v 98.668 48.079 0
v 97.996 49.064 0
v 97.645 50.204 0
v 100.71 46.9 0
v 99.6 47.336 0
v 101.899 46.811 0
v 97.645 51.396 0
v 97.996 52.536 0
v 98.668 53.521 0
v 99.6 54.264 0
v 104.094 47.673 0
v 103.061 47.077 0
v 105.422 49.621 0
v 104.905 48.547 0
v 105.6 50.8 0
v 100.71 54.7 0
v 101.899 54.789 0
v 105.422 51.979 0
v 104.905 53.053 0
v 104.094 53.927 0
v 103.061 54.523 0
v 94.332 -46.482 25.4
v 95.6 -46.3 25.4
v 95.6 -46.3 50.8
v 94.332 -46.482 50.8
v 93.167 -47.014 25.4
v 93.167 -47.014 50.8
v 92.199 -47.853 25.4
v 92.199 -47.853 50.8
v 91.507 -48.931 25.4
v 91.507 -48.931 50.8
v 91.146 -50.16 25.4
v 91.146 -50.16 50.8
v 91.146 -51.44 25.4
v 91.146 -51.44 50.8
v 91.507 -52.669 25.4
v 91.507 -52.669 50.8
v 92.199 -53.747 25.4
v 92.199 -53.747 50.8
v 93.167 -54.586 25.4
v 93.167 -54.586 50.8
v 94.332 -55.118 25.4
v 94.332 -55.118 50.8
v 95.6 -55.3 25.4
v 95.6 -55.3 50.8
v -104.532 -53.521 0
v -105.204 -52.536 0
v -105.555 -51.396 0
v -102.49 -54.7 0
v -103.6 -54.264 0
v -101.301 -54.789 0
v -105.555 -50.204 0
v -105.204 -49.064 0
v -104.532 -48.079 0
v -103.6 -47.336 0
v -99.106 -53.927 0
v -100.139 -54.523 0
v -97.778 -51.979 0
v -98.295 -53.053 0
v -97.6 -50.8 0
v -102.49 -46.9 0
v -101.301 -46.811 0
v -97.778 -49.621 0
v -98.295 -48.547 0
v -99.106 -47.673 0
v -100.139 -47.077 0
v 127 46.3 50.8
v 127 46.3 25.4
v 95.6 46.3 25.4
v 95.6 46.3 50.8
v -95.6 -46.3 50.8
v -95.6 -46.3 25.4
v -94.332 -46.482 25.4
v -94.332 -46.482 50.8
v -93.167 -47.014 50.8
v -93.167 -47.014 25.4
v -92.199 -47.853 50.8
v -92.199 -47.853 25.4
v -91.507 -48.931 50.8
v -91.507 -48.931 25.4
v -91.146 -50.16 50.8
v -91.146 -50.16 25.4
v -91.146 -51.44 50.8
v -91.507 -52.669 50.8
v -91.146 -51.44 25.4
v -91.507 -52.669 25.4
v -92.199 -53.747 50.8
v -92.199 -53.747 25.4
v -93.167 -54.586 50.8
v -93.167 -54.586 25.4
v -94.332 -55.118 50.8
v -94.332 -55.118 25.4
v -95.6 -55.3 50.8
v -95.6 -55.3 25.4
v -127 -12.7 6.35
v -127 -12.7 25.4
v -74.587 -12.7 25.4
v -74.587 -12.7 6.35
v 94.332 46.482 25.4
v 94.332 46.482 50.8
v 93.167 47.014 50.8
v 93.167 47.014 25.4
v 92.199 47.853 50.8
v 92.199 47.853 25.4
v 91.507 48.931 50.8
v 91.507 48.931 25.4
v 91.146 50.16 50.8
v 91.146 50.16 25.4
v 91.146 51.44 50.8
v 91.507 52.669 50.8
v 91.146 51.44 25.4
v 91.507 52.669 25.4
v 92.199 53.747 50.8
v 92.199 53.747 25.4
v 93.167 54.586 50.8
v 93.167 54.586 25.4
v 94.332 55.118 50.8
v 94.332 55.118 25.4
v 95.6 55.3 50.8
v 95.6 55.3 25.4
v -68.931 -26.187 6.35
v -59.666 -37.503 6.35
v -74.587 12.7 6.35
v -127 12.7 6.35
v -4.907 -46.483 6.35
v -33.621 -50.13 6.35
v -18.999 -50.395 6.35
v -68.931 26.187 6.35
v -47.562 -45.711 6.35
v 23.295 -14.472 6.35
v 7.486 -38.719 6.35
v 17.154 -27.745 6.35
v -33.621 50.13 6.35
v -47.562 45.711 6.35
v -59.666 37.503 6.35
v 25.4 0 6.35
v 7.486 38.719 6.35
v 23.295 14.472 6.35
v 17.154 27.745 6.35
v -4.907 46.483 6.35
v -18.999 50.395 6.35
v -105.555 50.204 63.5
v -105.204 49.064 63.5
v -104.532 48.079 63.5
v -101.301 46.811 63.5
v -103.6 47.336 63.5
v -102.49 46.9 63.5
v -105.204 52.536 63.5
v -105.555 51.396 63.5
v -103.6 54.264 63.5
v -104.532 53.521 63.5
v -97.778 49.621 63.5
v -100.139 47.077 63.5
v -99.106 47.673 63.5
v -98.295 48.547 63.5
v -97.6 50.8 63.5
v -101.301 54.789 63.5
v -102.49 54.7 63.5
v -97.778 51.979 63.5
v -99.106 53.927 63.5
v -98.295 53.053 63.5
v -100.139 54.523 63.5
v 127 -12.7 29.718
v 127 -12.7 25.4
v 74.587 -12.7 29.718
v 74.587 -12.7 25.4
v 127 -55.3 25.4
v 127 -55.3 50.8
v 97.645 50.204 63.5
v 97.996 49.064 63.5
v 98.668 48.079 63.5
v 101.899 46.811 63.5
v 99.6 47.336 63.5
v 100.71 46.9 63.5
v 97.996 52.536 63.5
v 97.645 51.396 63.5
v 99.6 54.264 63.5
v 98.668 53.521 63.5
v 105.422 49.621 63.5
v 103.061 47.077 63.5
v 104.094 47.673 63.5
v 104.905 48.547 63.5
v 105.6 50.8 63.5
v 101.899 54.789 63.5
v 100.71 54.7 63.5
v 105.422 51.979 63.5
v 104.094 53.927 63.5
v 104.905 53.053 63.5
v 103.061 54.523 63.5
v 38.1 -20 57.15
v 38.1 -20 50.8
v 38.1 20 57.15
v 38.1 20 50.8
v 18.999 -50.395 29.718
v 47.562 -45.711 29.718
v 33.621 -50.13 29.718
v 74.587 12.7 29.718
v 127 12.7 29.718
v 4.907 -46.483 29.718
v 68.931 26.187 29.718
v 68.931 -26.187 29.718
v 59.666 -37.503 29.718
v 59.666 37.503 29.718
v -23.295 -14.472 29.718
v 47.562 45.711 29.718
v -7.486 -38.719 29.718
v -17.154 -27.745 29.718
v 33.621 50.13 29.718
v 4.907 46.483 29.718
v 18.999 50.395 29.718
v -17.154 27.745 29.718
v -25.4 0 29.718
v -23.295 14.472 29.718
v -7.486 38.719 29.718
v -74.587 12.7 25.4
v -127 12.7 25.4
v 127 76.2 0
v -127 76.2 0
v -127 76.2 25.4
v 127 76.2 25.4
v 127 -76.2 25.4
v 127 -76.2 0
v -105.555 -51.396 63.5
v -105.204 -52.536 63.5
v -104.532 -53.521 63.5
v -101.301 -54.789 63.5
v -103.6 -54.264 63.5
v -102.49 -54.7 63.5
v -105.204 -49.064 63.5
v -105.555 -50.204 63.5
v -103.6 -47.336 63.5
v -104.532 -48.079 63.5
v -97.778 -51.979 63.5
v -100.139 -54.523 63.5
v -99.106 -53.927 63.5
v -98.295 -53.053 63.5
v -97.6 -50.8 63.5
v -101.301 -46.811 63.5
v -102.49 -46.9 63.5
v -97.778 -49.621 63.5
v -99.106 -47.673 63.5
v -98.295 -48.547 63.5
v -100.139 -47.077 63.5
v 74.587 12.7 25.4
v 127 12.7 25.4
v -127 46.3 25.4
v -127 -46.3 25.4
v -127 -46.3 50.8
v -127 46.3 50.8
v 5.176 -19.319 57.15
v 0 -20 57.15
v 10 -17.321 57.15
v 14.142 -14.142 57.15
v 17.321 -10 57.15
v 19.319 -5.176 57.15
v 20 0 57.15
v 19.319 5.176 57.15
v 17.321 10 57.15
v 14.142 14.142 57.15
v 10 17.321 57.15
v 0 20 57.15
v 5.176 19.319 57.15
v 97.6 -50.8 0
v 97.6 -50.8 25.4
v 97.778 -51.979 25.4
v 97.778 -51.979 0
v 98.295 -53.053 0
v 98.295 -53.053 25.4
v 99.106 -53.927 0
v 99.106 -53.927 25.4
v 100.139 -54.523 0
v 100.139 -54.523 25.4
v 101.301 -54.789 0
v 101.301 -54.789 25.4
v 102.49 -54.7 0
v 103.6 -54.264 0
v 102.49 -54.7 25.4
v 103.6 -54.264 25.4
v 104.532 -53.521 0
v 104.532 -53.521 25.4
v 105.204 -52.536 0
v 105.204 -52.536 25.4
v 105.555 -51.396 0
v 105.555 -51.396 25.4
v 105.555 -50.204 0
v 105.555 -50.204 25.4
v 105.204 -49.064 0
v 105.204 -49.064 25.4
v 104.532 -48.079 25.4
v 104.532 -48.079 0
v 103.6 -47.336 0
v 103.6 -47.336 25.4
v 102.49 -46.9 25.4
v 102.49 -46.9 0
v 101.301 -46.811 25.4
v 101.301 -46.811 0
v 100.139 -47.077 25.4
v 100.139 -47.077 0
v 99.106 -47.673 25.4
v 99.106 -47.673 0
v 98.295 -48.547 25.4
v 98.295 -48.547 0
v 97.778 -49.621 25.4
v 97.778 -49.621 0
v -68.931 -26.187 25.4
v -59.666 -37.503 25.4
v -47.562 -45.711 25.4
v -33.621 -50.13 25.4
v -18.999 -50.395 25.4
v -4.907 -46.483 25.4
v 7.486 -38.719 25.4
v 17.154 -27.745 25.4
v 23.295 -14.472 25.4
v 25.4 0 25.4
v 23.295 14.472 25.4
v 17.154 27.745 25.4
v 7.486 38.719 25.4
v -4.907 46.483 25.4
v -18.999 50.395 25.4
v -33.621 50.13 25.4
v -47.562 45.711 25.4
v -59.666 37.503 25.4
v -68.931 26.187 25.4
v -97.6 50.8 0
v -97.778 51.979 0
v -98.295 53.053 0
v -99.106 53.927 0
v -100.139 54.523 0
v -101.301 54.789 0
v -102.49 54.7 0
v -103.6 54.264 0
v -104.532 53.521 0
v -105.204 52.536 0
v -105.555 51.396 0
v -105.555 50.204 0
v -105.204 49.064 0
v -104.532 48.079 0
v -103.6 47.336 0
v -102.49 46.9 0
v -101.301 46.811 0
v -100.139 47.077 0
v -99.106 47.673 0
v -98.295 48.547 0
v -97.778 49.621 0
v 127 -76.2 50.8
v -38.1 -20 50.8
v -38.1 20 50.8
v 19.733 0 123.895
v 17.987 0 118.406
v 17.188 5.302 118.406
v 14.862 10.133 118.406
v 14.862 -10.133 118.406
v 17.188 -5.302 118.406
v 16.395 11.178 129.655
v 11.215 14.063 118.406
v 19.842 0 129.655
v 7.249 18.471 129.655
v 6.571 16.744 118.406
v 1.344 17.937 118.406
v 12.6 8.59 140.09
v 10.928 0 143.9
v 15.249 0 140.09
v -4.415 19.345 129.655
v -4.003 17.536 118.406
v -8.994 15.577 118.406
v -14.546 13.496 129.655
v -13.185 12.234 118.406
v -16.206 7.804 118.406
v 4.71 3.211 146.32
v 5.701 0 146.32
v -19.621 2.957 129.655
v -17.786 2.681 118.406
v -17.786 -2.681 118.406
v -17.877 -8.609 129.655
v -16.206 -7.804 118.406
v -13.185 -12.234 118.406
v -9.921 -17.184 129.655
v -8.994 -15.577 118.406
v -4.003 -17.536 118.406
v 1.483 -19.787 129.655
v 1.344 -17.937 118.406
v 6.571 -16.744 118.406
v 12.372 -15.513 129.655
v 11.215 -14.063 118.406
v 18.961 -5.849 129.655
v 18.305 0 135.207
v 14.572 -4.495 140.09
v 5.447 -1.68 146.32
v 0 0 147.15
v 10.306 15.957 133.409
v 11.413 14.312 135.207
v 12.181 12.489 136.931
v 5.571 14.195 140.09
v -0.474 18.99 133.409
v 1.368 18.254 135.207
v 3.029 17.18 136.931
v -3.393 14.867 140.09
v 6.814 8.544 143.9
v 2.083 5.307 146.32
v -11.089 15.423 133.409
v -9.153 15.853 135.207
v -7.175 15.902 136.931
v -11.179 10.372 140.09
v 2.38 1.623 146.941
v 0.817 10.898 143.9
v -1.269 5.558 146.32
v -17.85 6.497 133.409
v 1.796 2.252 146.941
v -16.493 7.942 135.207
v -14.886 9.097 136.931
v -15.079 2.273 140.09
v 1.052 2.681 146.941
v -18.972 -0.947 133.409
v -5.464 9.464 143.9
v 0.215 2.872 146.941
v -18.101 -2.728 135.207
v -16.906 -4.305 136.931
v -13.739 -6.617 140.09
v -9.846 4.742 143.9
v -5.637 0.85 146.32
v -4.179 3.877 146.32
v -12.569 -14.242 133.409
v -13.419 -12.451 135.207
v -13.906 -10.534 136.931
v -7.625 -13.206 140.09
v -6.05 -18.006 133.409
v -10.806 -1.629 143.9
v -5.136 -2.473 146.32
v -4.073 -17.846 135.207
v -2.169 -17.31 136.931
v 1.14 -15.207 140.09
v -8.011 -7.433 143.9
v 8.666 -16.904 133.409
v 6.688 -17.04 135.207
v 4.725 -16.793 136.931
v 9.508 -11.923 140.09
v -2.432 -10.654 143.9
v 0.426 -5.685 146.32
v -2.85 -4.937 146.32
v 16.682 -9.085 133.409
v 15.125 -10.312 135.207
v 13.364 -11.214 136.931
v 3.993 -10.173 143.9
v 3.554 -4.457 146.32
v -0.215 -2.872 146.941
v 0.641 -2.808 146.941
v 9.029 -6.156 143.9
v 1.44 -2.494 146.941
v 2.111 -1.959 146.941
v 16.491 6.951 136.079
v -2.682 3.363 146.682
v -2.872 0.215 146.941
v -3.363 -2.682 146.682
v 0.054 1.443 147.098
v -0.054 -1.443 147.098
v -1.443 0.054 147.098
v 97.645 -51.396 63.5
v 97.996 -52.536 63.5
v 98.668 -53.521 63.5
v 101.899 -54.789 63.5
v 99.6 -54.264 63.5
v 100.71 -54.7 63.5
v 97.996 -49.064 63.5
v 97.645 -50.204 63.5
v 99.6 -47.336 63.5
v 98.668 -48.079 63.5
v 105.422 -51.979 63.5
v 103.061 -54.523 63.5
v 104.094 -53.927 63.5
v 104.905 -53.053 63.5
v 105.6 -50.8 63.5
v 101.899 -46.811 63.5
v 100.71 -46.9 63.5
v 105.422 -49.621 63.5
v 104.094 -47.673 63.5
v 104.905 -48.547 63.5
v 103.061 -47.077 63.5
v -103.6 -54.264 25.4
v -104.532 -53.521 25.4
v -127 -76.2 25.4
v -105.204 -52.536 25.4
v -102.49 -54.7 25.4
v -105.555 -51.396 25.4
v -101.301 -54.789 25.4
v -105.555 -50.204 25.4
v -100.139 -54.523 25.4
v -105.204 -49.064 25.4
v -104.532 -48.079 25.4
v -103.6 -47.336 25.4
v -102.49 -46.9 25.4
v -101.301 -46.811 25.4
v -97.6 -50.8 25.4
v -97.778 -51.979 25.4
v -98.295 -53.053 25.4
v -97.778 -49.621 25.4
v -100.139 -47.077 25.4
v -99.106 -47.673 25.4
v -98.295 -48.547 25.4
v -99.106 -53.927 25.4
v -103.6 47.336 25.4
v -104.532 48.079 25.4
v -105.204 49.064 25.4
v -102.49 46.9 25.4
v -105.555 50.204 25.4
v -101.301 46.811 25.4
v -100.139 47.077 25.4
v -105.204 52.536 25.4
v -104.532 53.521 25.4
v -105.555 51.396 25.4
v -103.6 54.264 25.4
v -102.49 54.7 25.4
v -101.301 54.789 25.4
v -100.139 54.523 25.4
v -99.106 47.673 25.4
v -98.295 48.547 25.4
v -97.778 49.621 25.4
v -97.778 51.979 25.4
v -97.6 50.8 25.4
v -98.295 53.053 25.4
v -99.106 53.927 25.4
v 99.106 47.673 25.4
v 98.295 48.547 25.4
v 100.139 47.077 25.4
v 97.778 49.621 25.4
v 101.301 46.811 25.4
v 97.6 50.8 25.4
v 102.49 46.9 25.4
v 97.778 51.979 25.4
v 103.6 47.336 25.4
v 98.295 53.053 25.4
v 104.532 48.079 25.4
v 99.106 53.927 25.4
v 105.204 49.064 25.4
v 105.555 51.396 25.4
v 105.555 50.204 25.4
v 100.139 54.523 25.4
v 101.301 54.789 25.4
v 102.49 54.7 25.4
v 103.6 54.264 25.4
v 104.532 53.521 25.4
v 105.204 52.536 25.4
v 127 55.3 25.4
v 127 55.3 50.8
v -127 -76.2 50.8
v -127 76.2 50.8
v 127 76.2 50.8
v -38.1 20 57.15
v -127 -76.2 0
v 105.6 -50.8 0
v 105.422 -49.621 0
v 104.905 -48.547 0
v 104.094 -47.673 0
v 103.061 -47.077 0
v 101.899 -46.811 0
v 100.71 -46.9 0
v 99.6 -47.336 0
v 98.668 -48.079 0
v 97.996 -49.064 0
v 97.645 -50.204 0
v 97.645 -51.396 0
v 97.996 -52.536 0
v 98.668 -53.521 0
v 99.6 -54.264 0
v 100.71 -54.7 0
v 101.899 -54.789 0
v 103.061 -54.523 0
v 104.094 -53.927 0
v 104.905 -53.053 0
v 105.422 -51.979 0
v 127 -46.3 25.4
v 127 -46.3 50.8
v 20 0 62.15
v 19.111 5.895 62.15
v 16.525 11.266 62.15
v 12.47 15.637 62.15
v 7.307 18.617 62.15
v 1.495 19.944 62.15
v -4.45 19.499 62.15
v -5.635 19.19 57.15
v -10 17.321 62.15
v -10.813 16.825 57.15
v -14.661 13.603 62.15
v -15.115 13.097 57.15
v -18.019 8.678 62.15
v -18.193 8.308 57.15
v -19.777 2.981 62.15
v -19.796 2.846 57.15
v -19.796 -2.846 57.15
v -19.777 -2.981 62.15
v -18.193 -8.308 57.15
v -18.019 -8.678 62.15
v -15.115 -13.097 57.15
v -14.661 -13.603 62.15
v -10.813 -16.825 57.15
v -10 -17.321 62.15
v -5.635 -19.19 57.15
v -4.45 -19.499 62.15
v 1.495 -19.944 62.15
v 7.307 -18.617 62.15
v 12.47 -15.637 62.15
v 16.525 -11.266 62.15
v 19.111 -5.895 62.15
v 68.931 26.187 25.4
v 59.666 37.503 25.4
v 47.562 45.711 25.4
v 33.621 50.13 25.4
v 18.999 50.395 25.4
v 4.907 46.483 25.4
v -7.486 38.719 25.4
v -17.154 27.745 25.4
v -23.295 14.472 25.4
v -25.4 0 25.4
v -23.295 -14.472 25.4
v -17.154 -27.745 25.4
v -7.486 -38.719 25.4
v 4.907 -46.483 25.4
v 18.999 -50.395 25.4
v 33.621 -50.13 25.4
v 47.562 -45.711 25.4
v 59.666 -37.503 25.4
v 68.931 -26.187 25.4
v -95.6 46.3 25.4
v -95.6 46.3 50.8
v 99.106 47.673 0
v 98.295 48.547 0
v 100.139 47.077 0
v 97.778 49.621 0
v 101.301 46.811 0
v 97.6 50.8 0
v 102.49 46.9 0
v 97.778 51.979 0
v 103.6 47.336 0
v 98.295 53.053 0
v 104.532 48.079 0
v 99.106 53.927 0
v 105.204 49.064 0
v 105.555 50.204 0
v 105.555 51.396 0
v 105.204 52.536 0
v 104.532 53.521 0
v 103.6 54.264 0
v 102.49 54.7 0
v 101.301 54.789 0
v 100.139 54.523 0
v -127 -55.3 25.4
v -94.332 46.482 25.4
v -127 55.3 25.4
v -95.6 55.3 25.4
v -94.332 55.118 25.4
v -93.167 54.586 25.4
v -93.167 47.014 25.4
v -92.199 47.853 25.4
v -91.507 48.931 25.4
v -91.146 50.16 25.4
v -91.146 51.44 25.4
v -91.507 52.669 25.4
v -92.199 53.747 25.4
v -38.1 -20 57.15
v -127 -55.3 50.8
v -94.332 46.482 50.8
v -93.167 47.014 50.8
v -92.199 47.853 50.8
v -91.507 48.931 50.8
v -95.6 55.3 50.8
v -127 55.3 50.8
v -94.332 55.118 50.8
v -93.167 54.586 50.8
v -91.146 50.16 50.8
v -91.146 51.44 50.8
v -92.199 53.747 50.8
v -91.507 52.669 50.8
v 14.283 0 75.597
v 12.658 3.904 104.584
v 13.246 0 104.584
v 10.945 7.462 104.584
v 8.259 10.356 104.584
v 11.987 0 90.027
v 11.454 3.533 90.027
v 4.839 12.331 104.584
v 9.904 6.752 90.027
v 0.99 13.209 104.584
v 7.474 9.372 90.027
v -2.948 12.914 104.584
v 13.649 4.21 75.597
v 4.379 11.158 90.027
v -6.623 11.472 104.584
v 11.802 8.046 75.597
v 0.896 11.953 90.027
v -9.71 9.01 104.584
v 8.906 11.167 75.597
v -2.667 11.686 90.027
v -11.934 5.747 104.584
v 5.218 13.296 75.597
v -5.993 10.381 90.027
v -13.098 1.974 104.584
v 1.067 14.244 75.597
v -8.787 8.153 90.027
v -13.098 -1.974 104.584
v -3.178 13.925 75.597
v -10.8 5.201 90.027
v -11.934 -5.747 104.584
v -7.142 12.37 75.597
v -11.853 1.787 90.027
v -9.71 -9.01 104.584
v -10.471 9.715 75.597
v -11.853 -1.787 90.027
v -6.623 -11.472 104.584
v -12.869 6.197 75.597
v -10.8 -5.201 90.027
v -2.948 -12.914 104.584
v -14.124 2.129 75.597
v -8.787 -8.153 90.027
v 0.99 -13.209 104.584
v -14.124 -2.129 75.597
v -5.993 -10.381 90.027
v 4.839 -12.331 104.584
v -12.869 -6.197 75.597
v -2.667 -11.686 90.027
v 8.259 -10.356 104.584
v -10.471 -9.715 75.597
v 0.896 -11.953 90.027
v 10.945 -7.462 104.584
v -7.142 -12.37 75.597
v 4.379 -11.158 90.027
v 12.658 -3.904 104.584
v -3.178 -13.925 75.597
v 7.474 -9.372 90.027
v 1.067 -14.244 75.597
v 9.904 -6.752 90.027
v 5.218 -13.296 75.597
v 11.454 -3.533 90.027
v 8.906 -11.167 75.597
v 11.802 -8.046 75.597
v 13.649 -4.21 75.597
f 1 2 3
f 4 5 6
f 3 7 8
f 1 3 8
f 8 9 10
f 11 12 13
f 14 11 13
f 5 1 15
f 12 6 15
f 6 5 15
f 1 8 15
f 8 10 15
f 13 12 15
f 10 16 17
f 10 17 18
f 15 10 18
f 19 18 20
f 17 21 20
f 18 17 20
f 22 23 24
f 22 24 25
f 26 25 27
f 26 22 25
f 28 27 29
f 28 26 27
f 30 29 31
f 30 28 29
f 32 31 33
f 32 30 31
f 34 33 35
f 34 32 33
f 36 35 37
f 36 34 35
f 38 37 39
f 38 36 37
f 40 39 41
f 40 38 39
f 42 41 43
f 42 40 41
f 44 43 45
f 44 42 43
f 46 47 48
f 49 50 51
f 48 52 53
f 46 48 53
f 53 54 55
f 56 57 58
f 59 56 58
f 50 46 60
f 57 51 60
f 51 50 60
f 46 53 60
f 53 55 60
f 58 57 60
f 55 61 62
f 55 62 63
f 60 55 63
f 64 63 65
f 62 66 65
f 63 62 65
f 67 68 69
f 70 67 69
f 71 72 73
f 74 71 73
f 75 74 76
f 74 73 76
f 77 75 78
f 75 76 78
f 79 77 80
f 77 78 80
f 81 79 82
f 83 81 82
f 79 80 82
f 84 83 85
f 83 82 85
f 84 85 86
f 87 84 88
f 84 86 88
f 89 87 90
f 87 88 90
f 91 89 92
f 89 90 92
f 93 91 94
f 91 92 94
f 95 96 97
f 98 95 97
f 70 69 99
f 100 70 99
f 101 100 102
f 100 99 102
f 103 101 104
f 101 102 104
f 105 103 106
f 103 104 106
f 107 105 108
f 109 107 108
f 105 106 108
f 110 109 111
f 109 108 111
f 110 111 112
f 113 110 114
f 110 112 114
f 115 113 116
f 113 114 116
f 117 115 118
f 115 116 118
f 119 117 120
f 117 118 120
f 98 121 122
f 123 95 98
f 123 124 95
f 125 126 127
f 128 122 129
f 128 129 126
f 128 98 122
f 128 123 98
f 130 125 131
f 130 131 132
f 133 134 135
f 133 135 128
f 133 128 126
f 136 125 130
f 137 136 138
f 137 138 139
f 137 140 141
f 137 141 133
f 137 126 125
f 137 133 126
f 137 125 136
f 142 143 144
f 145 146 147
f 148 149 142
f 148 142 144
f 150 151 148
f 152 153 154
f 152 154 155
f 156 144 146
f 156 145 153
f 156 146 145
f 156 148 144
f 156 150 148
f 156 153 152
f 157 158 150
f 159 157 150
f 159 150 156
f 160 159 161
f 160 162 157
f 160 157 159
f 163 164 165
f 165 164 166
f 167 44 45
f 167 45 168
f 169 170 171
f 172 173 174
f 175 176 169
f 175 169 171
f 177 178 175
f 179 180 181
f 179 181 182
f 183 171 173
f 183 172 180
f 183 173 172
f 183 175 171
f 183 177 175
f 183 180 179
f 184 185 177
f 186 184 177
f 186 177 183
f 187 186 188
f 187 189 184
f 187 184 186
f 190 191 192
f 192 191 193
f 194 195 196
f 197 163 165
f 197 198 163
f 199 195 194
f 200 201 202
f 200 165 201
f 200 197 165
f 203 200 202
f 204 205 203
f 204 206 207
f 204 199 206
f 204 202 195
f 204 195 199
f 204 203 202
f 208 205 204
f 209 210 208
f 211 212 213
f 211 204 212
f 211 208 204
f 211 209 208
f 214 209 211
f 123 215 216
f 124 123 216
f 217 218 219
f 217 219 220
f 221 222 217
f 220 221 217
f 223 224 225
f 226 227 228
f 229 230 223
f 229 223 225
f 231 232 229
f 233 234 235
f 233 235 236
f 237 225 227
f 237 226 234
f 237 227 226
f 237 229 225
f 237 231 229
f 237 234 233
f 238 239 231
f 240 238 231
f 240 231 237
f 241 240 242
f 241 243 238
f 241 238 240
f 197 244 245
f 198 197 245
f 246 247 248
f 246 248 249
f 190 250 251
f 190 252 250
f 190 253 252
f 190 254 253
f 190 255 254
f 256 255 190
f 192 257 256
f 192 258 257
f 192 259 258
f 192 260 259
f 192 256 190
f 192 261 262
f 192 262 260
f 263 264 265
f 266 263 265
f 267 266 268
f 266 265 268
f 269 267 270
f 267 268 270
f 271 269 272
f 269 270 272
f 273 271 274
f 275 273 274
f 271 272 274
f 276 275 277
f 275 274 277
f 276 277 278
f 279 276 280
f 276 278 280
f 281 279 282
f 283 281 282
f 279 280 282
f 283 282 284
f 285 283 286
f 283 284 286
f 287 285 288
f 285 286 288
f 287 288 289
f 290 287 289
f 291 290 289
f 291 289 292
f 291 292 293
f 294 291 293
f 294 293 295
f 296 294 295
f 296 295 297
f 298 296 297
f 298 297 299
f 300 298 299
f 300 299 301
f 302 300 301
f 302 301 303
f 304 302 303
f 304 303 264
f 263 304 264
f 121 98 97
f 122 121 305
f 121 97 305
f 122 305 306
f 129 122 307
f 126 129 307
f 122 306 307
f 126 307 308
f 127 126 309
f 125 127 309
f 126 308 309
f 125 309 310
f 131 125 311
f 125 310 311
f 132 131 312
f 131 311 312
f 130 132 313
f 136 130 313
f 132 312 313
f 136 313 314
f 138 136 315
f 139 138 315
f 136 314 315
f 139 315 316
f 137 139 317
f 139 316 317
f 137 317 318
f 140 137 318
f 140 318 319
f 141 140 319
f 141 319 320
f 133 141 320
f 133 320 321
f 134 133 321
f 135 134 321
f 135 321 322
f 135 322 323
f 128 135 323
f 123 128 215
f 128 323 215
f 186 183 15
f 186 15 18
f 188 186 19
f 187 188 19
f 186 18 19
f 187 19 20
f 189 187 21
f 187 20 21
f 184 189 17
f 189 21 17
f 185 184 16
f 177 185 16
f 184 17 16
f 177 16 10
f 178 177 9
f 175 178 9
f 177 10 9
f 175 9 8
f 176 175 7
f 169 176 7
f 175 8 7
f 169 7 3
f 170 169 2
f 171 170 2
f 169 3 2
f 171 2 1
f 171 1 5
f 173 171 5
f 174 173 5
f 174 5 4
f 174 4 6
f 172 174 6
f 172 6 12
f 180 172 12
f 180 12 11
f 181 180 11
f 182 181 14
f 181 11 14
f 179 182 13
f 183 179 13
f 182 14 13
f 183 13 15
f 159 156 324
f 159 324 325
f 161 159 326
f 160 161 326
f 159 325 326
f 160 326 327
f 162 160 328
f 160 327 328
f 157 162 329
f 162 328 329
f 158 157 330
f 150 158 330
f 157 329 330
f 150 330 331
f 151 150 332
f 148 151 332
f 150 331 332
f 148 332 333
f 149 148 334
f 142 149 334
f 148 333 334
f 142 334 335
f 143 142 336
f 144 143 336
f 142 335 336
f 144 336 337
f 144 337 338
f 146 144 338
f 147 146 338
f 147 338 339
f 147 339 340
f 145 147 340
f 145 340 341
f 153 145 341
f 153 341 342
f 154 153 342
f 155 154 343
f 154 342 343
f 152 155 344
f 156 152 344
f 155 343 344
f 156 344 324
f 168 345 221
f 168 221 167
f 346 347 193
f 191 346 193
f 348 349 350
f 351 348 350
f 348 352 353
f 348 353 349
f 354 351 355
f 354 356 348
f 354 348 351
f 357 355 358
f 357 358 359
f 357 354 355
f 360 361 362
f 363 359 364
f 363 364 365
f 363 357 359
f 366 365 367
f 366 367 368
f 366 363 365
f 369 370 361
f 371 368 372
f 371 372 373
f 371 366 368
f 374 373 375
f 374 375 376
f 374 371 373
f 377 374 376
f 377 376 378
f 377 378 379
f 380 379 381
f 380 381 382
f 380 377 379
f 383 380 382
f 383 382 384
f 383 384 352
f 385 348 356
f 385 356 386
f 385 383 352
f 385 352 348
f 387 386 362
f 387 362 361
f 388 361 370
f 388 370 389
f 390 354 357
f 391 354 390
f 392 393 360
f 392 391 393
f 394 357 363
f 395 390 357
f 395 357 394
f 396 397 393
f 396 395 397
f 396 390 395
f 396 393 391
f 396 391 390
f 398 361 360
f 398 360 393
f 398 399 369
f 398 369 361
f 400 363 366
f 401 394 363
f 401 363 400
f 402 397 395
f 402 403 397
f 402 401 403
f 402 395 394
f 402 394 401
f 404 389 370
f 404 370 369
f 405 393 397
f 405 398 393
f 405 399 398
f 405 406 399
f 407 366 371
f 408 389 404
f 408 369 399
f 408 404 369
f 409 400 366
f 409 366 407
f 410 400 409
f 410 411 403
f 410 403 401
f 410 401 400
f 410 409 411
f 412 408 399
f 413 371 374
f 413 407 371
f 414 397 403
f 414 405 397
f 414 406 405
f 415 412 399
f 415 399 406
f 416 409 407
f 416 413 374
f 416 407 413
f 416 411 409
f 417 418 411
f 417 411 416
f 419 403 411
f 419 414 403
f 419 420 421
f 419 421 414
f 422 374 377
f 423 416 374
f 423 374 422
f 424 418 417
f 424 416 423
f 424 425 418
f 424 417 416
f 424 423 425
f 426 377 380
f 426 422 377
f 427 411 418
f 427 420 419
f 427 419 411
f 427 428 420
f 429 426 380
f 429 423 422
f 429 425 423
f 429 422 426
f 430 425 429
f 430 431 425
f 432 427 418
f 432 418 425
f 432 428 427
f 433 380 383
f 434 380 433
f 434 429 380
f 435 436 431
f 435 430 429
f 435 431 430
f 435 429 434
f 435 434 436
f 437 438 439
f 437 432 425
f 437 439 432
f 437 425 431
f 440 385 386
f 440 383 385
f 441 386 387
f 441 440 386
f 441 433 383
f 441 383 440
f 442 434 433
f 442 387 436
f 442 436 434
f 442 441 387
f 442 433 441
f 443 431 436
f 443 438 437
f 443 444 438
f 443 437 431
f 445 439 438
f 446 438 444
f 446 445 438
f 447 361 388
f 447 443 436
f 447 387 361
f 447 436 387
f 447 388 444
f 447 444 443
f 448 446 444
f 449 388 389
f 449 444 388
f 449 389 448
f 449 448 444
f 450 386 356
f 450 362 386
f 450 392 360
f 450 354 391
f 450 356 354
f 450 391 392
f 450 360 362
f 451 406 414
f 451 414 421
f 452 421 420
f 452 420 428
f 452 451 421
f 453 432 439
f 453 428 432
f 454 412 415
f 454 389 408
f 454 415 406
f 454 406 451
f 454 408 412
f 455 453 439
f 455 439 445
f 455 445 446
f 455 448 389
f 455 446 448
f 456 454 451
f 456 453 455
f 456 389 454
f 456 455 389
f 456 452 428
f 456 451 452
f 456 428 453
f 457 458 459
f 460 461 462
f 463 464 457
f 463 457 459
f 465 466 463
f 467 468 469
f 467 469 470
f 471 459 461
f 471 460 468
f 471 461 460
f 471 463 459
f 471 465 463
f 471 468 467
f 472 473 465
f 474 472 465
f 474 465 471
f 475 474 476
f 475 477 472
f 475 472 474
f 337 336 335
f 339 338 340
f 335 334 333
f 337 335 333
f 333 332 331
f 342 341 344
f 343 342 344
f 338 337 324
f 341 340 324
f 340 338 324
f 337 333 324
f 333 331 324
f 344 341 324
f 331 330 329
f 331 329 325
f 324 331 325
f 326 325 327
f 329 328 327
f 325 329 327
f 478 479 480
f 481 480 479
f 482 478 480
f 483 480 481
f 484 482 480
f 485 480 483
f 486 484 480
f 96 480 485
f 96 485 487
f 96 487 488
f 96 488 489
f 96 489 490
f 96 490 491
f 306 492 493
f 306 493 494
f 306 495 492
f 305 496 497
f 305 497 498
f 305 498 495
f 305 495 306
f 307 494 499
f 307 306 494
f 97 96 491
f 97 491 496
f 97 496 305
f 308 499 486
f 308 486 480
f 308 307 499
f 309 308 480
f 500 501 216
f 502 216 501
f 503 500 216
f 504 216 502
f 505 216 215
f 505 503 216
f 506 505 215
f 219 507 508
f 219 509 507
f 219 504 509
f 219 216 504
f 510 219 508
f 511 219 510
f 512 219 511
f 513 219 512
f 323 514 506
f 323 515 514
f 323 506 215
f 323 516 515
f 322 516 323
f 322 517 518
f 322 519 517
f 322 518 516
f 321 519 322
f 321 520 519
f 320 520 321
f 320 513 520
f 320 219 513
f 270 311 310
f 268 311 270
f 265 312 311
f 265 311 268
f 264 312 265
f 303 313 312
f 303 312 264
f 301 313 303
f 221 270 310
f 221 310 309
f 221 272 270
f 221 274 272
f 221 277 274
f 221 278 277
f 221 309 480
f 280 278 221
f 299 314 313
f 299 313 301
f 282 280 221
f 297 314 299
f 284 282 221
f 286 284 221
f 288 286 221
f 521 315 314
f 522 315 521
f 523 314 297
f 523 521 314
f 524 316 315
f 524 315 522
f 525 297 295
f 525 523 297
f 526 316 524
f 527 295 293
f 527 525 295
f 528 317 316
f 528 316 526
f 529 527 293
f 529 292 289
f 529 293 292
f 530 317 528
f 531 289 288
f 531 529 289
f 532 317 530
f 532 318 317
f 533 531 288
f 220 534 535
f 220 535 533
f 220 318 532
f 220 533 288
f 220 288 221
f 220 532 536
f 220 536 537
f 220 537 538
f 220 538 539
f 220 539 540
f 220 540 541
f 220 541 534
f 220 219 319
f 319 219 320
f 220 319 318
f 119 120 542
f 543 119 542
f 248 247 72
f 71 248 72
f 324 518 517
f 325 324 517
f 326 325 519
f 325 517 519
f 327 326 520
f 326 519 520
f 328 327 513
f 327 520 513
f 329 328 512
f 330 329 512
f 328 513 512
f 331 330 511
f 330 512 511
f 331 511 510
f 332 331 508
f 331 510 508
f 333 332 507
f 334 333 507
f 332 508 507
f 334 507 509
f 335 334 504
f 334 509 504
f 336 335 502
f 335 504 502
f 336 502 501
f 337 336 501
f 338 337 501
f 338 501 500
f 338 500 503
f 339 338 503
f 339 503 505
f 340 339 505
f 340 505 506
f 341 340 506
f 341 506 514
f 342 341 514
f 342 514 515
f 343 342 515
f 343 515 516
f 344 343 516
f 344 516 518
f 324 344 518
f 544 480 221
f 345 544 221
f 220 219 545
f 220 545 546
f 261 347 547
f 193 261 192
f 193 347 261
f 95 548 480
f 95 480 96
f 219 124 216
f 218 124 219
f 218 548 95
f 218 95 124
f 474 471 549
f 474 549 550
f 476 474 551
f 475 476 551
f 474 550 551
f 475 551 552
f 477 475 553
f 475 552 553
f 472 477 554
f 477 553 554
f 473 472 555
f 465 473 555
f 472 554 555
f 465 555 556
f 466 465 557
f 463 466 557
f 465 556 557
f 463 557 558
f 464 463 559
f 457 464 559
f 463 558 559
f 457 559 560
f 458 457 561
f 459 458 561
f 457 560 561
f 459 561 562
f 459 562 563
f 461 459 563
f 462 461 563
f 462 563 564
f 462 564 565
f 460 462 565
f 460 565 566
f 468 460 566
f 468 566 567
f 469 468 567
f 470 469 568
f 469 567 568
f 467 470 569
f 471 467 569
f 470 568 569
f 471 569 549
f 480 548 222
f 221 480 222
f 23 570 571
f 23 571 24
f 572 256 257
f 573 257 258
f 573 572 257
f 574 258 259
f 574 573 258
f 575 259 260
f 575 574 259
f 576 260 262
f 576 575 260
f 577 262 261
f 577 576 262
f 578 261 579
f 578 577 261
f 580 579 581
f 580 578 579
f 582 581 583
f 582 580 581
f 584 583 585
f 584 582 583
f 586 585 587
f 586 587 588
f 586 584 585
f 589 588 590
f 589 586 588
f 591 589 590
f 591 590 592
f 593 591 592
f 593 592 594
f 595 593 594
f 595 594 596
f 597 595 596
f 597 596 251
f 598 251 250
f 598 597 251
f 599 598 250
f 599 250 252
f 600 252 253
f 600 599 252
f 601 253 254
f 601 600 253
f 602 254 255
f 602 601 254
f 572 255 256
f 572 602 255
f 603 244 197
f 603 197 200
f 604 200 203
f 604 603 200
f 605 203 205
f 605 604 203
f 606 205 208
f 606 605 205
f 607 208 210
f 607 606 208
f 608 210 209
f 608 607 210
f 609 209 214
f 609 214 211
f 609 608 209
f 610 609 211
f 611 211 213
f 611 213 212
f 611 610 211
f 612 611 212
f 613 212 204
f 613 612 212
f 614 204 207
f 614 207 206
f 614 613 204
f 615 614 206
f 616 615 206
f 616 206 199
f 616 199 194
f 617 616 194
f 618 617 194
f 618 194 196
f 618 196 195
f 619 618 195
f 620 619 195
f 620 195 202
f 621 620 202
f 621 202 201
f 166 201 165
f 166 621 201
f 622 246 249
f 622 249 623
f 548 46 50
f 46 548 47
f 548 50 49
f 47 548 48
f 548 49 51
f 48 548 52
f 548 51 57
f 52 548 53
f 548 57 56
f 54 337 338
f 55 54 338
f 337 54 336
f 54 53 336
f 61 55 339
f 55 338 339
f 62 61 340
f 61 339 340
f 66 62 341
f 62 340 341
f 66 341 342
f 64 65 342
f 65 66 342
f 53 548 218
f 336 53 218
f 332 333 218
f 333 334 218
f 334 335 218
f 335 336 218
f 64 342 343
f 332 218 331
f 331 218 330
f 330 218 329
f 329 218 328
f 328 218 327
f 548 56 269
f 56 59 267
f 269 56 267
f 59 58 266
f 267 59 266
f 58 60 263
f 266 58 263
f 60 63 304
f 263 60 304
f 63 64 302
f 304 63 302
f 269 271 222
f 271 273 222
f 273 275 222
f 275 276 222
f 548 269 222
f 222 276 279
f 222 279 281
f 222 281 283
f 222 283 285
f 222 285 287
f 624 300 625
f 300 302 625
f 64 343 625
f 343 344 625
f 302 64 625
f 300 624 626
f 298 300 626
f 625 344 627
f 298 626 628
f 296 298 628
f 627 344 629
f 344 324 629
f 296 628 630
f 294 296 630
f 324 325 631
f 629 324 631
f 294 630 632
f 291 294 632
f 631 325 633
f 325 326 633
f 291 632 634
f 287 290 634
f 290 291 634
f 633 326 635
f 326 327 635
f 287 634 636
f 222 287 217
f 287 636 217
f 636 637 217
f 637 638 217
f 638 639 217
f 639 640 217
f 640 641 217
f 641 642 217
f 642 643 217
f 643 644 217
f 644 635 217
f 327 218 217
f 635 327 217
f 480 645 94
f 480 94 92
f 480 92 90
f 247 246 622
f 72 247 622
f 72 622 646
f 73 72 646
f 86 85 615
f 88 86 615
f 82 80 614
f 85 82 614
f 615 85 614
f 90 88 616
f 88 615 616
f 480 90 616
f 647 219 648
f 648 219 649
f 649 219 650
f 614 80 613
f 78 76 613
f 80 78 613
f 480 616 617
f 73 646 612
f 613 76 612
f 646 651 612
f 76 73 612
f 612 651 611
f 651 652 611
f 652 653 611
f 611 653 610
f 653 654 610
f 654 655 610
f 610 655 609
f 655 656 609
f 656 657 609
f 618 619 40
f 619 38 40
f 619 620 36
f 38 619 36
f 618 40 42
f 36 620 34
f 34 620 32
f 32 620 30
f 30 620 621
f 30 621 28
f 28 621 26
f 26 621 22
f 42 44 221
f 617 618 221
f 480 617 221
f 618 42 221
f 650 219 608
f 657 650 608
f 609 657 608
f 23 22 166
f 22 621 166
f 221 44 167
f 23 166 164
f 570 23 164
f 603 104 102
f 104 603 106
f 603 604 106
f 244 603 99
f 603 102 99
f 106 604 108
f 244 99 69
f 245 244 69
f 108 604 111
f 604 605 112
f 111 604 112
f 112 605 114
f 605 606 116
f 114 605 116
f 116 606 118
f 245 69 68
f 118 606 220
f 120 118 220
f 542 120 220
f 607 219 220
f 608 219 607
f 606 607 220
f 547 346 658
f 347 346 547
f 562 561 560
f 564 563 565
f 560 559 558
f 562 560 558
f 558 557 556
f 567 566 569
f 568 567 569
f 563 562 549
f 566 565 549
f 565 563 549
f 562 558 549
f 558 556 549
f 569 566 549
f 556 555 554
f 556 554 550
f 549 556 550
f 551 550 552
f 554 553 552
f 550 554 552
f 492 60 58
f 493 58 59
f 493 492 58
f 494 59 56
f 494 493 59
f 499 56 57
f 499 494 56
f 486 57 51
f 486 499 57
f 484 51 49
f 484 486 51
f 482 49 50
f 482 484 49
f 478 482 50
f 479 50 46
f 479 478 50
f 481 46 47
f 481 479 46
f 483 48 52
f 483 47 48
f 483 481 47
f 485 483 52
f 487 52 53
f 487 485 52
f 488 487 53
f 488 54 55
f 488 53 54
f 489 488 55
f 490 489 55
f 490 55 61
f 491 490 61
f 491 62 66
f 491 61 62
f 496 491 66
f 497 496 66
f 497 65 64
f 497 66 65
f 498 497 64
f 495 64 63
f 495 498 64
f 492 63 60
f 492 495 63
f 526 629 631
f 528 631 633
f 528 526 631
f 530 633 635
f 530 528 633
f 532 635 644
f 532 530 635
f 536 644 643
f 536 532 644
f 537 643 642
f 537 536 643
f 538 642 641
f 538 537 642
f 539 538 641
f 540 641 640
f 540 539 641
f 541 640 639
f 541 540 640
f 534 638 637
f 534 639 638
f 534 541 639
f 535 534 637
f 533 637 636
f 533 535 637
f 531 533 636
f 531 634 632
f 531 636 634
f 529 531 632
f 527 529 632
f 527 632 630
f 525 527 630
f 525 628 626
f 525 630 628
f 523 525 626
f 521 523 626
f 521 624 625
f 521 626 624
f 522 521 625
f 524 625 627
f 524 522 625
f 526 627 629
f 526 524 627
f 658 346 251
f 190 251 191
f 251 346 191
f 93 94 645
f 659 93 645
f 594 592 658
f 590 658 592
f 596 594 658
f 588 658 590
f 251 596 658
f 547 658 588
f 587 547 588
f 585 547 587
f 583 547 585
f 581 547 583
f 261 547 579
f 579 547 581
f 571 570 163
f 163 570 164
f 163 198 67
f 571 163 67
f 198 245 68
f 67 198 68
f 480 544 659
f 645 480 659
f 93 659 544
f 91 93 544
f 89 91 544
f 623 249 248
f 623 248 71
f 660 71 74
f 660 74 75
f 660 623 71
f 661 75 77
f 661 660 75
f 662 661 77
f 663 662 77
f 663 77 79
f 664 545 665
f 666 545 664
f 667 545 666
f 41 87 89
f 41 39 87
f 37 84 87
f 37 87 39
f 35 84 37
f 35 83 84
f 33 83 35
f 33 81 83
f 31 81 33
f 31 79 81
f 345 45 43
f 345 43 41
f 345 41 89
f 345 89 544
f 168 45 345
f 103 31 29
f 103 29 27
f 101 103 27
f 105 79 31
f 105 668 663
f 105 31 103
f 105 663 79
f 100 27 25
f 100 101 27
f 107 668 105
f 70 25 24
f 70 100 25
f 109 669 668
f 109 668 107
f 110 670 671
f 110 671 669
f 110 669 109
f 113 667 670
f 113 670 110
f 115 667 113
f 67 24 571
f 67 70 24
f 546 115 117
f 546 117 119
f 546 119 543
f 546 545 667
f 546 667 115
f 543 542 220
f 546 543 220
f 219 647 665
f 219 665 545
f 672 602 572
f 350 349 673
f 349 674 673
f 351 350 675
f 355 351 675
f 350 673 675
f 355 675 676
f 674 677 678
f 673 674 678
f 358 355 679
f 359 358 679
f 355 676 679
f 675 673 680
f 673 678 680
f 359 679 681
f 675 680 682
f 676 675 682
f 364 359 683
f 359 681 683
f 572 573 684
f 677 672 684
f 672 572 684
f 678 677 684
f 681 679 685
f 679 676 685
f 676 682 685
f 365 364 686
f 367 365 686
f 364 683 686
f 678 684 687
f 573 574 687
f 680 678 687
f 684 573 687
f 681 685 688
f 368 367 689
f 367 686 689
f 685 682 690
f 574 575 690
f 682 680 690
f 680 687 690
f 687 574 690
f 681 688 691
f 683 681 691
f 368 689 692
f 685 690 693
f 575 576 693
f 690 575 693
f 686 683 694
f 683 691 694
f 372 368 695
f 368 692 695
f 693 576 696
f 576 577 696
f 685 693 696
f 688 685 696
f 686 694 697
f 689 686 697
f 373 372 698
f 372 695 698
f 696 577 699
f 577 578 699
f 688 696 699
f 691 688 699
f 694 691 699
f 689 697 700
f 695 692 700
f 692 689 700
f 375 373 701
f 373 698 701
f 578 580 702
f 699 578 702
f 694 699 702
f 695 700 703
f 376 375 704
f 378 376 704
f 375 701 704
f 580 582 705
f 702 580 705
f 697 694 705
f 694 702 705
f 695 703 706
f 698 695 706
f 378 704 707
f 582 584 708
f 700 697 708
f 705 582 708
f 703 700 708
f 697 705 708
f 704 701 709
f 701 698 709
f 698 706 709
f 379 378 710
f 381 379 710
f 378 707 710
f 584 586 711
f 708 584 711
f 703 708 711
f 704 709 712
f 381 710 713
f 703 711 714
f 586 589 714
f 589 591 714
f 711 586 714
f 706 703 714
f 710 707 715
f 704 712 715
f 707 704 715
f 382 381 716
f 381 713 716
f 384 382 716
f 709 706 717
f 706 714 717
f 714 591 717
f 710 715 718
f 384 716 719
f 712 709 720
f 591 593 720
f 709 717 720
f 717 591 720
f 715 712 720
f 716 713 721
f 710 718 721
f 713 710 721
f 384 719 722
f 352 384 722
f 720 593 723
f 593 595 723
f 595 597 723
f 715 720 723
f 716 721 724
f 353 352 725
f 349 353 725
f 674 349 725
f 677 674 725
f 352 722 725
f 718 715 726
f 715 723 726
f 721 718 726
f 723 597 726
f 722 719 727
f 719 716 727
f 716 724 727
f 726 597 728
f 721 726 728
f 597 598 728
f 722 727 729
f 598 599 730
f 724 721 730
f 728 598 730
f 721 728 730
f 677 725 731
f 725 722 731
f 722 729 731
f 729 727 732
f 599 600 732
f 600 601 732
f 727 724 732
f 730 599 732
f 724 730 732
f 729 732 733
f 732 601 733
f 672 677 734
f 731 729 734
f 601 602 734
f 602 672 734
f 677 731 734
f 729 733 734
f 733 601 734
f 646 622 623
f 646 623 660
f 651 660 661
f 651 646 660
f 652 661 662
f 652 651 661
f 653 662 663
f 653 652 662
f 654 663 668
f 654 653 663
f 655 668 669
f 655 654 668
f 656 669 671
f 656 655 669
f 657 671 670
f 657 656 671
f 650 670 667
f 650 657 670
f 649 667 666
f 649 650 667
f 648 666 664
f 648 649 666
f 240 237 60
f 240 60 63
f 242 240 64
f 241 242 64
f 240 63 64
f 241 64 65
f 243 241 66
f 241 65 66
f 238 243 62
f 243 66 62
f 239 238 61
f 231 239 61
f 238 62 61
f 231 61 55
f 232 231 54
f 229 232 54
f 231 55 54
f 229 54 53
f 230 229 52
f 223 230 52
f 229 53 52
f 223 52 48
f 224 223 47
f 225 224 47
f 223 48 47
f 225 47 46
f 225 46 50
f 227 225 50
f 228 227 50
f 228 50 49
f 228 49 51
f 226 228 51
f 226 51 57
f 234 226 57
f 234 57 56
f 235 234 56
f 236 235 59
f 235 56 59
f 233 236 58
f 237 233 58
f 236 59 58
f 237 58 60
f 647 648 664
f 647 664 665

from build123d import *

# Parameters (mm, degrees)
SKETCH_W                      = 254
SKETCH_H                      = 152.4
PAD_DEPTH                     = 25.4
SKETCH001_R                   = 4
POCKET_DEPTH                  = 619.999755
SKETCH001_MIRRORED_2_R        = 4
POCKET_MIRRORED_2_DEPTH       = 619.999755
POCKET001_DEPTH               = 19.05
CYLINDER_R                    = 4
CYLINDER_DEPTH                = 63.5
CYLINDER001_R                 = 4
CYLINDER001_DEPTH             = 63.5
CYLINDER002_R                 = 4
CYLINDER002_DEPTH             = 63.5
CYLINDER003_R                 = 4
CYLINDER003_DEPTH             = 63.5
SKETCH003_W                   = 254
SKETCH003_H                   = 152.4
PAD001_DEPTH                  = 25.4
POCKET002_DEPTH               = 619.999755
POCKET003_DEPTH               = 4.318
POCKET002_MIRRORED002_2_DEPTH = 619.999755
SKETCH006_W                   = 76.2
SKETCH006_H                   = 40
PAD002_DEPTH                  = 6.35


with BuildPart() as body:
    # Sketch → Pad (new body)
    with BuildSketch(Plane.XY):
        Rectangle(SKETCH_W, SKETCH_H)
    extrude(amount=PAD_DEPTH)

    # Sketch001 (on Face6 of Pad) → Pocket (cut, through all)
    with BuildSketch(Plane.XY.offset(25.4)):
        with Locations((-101.6, 50.8)):
            Circle(SKETCH001_R)
    pocket = extrude(amount=-POCKET_DEPTH, mode=Mode.SUBTRACT)

    # Sketch001 Mirrored 2 → Pocket Mirrored 2 (cut, through all)
    with BuildSketch(Plane(origin=(0, 0, 25.4), x_dir=(-1, 0, 0), z_dir=(0, 0, -1))):
        with Locations((-101.6, 50.8)):
            Circle(SKETCH001_MIRRORED_2_R)
    pocket_mirrored_2 = extrude(amount=POCKET_MIRRORED_2_DEPTH, mode=Mode.SUBTRACT)

    # Mirrored001: Pocket, Pocket Mirrored 2 across XZ
    add(pocket.mirror(Plane.XZ), mode=Mode.SUBTRACT)
    add(pocket_mirrored_2.mirror(Plane.XZ), mode=Mode.SUBTRACT)

    # Sketch002 (on Face5 of MultiTransform) → Pocket001 (cut)
    with BuildSketch(Plane.XY.offset(25.4)):
        with BuildLine():
            Line((-127, -12.7), (-74.586888, -12.7))
            ThreePointArc((-74.586888, -12.7), (25.4, 0), (-74.586888, 12.7))
            Line((-74.586888, 12.7), (-127, 12.7))
            Line((-127, 12.7), (-127, -12.7))
        make_face()
    extrude(amount=-POCKET001_DEPTH, mode=Mode.SUBTRACT)


with BuildPart() as cylinder:
    # Cylinder → Cylinder (new body)
    with BuildSketch(Plane(origin=(-101.6, 50.8, 0), x_dir=(1, 0, 0), z_dir=(0, 0, 1))):
        Circle(CYLINDER_R)
    extrude(amount=CYLINDER_DEPTH)


with BuildPart() as cylinder001:
    # Cylinder001 → Cylinder001 (new body)
    with BuildSketch(Plane(origin=(101.6, 50.8, 0), x_dir=(1, 0, 0), z_dir=(0, 0, 1))):
        Circle(CYLINDER001_R)
    extrude(amount=CYLINDER001_DEPTH)


with BuildPart() as cylinder002:
    # Cylinder002 → Cylinder002 (new body)
    with BuildSketch(Plane(origin=(-101.6, -50.8, 0), x_dir=(1, 0, 0), z_dir=(0, 0, 1))):
        Circle(CYLINDER002_R)
    extrude(amount=CYLINDER002_DEPTH)


with BuildPart() as cylinder003:
    # Cylinder003 → Cylinder003 (new body)
    with BuildSketch(Plane(origin=(101.6, -50.8, 0), x_dir=(1, 0, 0), z_dir=(0, 0, 1))):
        Circle(CYLINDER003_R)
    extrude(amount=CYLINDER003_DEPTH)


with BuildPart() as body001:
    # Sketch003 (on Face1 of ShapeBinder) → Pad001 (new body)
    with BuildSketch(Plane.XY.offset(25.4)):
        Rectangle(SKETCH003_W, SKETCH003_H)
    extrude(amount=PAD001_DEPTH)

    # Sketch004 (on Face1 of ShapeBinder) → Pocket002 (cut, through all)
    with BuildSketch(Plane.XY.offset(25.4)):
        with BuildLine():
            ThreePointArc((-95.6, 46.3), (-91.1, 50.8), (-95.6, 55.3))
            Line((-95.6, 55.3), (-127, 55.3))
            Line((-127, 55.3), (-127, 46.3))
            Line((-127, 46.3), (-95.6, 46.3))
        make_face()
    pocket002 = extrude(amount=POCKET002_DEPTH, mode=Mode.SUBTRACT)

    # Sketch005 (on Face1 of ShapeBinder) → Pocket003 (cut)
    with BuildSketch(Plane.XY.offset(25.4)):
        with BuildLine():
            Line((127, -12.7), (74.586888, -12.7))
            ThreePointArc((74.586888, 12.7), (-25.4, 0), (74.586888, -12.7))
            Line((74.586888, 12.7), (127, 12.7))
            Line((127, 12.7), (127, -12.7))
        make_face()
    extrude(amount=POCKET003_DEPTH, mode=Mode.SUBTRACT)

    # Sketch004 Mirrored002 2 → Pocket002 Mirrored002 2 (cut, through all)
    with BuildSketch(Plane(origin=(0, 0, 25.4), x_dir=(-1, 0, 0), z_dir=(0, 0, -1))):
        with BuildLine():
            ThreePointArc((-95.6, 46.3), (-91.1, 50.8), (-95.6, 55.3))
            Line((-95.6, 55.3), (-127, 55.3))
            Line((-127, 55.3), (-127, 46.3))
            Line((-127, 46.3), (-95.6, 46.3))
        make_face()
    pocket002_mirrored002_2 = extrude(amount=-POCKET002_MIRRORED002_2_DEPTH, mode=Mode.SUBTRACT)

    # Mirrored003: Pocket002, Pocket002 Mirrored002 2 across XZ
    add(pocket002.mirror(Plane.XZ), mode=Mode.SUBTRACT)
    add(pocket002_mirrored002_2.mirror(Plane.XZ), mode=Mode.SUBTRACT)


with BuildPart() as body002:
    # Sketch006 (on Face1 of ShapeBinder001) → Pad002 (new body)
    with BuildSketch(Plane.XY.offset(50.8)):
        Rectangle(SKETCH006_W, SKETCH006_H)
    extrude(amount=PAD002_DEPTH)

    # Sketch007 → Revolution (revolve)
    with BuildSketch(Plane.XZ):
        with BuildLine():
            Line((0, 57.15), (20, 57.15))
            Line((20, 57.15), (20, 62.15))
            ThreePointArc((17.987117, 118.405651), (11.986838, 90.027118), (20, 62.15))
            ThreePointArc((17.987117, 118.405651), (16.954158, 137.759265), (0, 147.15))
            Line((0, 147.15), (0, 57.15))
        make_face()
    revolve(axis=Axis((0, 0, 0), (0, 0, 1)))


solid = Compound([body.part, cylinder.part, cylinder001.part, cylinder002.part, cylinder003.part, body001.part, body002.part])
